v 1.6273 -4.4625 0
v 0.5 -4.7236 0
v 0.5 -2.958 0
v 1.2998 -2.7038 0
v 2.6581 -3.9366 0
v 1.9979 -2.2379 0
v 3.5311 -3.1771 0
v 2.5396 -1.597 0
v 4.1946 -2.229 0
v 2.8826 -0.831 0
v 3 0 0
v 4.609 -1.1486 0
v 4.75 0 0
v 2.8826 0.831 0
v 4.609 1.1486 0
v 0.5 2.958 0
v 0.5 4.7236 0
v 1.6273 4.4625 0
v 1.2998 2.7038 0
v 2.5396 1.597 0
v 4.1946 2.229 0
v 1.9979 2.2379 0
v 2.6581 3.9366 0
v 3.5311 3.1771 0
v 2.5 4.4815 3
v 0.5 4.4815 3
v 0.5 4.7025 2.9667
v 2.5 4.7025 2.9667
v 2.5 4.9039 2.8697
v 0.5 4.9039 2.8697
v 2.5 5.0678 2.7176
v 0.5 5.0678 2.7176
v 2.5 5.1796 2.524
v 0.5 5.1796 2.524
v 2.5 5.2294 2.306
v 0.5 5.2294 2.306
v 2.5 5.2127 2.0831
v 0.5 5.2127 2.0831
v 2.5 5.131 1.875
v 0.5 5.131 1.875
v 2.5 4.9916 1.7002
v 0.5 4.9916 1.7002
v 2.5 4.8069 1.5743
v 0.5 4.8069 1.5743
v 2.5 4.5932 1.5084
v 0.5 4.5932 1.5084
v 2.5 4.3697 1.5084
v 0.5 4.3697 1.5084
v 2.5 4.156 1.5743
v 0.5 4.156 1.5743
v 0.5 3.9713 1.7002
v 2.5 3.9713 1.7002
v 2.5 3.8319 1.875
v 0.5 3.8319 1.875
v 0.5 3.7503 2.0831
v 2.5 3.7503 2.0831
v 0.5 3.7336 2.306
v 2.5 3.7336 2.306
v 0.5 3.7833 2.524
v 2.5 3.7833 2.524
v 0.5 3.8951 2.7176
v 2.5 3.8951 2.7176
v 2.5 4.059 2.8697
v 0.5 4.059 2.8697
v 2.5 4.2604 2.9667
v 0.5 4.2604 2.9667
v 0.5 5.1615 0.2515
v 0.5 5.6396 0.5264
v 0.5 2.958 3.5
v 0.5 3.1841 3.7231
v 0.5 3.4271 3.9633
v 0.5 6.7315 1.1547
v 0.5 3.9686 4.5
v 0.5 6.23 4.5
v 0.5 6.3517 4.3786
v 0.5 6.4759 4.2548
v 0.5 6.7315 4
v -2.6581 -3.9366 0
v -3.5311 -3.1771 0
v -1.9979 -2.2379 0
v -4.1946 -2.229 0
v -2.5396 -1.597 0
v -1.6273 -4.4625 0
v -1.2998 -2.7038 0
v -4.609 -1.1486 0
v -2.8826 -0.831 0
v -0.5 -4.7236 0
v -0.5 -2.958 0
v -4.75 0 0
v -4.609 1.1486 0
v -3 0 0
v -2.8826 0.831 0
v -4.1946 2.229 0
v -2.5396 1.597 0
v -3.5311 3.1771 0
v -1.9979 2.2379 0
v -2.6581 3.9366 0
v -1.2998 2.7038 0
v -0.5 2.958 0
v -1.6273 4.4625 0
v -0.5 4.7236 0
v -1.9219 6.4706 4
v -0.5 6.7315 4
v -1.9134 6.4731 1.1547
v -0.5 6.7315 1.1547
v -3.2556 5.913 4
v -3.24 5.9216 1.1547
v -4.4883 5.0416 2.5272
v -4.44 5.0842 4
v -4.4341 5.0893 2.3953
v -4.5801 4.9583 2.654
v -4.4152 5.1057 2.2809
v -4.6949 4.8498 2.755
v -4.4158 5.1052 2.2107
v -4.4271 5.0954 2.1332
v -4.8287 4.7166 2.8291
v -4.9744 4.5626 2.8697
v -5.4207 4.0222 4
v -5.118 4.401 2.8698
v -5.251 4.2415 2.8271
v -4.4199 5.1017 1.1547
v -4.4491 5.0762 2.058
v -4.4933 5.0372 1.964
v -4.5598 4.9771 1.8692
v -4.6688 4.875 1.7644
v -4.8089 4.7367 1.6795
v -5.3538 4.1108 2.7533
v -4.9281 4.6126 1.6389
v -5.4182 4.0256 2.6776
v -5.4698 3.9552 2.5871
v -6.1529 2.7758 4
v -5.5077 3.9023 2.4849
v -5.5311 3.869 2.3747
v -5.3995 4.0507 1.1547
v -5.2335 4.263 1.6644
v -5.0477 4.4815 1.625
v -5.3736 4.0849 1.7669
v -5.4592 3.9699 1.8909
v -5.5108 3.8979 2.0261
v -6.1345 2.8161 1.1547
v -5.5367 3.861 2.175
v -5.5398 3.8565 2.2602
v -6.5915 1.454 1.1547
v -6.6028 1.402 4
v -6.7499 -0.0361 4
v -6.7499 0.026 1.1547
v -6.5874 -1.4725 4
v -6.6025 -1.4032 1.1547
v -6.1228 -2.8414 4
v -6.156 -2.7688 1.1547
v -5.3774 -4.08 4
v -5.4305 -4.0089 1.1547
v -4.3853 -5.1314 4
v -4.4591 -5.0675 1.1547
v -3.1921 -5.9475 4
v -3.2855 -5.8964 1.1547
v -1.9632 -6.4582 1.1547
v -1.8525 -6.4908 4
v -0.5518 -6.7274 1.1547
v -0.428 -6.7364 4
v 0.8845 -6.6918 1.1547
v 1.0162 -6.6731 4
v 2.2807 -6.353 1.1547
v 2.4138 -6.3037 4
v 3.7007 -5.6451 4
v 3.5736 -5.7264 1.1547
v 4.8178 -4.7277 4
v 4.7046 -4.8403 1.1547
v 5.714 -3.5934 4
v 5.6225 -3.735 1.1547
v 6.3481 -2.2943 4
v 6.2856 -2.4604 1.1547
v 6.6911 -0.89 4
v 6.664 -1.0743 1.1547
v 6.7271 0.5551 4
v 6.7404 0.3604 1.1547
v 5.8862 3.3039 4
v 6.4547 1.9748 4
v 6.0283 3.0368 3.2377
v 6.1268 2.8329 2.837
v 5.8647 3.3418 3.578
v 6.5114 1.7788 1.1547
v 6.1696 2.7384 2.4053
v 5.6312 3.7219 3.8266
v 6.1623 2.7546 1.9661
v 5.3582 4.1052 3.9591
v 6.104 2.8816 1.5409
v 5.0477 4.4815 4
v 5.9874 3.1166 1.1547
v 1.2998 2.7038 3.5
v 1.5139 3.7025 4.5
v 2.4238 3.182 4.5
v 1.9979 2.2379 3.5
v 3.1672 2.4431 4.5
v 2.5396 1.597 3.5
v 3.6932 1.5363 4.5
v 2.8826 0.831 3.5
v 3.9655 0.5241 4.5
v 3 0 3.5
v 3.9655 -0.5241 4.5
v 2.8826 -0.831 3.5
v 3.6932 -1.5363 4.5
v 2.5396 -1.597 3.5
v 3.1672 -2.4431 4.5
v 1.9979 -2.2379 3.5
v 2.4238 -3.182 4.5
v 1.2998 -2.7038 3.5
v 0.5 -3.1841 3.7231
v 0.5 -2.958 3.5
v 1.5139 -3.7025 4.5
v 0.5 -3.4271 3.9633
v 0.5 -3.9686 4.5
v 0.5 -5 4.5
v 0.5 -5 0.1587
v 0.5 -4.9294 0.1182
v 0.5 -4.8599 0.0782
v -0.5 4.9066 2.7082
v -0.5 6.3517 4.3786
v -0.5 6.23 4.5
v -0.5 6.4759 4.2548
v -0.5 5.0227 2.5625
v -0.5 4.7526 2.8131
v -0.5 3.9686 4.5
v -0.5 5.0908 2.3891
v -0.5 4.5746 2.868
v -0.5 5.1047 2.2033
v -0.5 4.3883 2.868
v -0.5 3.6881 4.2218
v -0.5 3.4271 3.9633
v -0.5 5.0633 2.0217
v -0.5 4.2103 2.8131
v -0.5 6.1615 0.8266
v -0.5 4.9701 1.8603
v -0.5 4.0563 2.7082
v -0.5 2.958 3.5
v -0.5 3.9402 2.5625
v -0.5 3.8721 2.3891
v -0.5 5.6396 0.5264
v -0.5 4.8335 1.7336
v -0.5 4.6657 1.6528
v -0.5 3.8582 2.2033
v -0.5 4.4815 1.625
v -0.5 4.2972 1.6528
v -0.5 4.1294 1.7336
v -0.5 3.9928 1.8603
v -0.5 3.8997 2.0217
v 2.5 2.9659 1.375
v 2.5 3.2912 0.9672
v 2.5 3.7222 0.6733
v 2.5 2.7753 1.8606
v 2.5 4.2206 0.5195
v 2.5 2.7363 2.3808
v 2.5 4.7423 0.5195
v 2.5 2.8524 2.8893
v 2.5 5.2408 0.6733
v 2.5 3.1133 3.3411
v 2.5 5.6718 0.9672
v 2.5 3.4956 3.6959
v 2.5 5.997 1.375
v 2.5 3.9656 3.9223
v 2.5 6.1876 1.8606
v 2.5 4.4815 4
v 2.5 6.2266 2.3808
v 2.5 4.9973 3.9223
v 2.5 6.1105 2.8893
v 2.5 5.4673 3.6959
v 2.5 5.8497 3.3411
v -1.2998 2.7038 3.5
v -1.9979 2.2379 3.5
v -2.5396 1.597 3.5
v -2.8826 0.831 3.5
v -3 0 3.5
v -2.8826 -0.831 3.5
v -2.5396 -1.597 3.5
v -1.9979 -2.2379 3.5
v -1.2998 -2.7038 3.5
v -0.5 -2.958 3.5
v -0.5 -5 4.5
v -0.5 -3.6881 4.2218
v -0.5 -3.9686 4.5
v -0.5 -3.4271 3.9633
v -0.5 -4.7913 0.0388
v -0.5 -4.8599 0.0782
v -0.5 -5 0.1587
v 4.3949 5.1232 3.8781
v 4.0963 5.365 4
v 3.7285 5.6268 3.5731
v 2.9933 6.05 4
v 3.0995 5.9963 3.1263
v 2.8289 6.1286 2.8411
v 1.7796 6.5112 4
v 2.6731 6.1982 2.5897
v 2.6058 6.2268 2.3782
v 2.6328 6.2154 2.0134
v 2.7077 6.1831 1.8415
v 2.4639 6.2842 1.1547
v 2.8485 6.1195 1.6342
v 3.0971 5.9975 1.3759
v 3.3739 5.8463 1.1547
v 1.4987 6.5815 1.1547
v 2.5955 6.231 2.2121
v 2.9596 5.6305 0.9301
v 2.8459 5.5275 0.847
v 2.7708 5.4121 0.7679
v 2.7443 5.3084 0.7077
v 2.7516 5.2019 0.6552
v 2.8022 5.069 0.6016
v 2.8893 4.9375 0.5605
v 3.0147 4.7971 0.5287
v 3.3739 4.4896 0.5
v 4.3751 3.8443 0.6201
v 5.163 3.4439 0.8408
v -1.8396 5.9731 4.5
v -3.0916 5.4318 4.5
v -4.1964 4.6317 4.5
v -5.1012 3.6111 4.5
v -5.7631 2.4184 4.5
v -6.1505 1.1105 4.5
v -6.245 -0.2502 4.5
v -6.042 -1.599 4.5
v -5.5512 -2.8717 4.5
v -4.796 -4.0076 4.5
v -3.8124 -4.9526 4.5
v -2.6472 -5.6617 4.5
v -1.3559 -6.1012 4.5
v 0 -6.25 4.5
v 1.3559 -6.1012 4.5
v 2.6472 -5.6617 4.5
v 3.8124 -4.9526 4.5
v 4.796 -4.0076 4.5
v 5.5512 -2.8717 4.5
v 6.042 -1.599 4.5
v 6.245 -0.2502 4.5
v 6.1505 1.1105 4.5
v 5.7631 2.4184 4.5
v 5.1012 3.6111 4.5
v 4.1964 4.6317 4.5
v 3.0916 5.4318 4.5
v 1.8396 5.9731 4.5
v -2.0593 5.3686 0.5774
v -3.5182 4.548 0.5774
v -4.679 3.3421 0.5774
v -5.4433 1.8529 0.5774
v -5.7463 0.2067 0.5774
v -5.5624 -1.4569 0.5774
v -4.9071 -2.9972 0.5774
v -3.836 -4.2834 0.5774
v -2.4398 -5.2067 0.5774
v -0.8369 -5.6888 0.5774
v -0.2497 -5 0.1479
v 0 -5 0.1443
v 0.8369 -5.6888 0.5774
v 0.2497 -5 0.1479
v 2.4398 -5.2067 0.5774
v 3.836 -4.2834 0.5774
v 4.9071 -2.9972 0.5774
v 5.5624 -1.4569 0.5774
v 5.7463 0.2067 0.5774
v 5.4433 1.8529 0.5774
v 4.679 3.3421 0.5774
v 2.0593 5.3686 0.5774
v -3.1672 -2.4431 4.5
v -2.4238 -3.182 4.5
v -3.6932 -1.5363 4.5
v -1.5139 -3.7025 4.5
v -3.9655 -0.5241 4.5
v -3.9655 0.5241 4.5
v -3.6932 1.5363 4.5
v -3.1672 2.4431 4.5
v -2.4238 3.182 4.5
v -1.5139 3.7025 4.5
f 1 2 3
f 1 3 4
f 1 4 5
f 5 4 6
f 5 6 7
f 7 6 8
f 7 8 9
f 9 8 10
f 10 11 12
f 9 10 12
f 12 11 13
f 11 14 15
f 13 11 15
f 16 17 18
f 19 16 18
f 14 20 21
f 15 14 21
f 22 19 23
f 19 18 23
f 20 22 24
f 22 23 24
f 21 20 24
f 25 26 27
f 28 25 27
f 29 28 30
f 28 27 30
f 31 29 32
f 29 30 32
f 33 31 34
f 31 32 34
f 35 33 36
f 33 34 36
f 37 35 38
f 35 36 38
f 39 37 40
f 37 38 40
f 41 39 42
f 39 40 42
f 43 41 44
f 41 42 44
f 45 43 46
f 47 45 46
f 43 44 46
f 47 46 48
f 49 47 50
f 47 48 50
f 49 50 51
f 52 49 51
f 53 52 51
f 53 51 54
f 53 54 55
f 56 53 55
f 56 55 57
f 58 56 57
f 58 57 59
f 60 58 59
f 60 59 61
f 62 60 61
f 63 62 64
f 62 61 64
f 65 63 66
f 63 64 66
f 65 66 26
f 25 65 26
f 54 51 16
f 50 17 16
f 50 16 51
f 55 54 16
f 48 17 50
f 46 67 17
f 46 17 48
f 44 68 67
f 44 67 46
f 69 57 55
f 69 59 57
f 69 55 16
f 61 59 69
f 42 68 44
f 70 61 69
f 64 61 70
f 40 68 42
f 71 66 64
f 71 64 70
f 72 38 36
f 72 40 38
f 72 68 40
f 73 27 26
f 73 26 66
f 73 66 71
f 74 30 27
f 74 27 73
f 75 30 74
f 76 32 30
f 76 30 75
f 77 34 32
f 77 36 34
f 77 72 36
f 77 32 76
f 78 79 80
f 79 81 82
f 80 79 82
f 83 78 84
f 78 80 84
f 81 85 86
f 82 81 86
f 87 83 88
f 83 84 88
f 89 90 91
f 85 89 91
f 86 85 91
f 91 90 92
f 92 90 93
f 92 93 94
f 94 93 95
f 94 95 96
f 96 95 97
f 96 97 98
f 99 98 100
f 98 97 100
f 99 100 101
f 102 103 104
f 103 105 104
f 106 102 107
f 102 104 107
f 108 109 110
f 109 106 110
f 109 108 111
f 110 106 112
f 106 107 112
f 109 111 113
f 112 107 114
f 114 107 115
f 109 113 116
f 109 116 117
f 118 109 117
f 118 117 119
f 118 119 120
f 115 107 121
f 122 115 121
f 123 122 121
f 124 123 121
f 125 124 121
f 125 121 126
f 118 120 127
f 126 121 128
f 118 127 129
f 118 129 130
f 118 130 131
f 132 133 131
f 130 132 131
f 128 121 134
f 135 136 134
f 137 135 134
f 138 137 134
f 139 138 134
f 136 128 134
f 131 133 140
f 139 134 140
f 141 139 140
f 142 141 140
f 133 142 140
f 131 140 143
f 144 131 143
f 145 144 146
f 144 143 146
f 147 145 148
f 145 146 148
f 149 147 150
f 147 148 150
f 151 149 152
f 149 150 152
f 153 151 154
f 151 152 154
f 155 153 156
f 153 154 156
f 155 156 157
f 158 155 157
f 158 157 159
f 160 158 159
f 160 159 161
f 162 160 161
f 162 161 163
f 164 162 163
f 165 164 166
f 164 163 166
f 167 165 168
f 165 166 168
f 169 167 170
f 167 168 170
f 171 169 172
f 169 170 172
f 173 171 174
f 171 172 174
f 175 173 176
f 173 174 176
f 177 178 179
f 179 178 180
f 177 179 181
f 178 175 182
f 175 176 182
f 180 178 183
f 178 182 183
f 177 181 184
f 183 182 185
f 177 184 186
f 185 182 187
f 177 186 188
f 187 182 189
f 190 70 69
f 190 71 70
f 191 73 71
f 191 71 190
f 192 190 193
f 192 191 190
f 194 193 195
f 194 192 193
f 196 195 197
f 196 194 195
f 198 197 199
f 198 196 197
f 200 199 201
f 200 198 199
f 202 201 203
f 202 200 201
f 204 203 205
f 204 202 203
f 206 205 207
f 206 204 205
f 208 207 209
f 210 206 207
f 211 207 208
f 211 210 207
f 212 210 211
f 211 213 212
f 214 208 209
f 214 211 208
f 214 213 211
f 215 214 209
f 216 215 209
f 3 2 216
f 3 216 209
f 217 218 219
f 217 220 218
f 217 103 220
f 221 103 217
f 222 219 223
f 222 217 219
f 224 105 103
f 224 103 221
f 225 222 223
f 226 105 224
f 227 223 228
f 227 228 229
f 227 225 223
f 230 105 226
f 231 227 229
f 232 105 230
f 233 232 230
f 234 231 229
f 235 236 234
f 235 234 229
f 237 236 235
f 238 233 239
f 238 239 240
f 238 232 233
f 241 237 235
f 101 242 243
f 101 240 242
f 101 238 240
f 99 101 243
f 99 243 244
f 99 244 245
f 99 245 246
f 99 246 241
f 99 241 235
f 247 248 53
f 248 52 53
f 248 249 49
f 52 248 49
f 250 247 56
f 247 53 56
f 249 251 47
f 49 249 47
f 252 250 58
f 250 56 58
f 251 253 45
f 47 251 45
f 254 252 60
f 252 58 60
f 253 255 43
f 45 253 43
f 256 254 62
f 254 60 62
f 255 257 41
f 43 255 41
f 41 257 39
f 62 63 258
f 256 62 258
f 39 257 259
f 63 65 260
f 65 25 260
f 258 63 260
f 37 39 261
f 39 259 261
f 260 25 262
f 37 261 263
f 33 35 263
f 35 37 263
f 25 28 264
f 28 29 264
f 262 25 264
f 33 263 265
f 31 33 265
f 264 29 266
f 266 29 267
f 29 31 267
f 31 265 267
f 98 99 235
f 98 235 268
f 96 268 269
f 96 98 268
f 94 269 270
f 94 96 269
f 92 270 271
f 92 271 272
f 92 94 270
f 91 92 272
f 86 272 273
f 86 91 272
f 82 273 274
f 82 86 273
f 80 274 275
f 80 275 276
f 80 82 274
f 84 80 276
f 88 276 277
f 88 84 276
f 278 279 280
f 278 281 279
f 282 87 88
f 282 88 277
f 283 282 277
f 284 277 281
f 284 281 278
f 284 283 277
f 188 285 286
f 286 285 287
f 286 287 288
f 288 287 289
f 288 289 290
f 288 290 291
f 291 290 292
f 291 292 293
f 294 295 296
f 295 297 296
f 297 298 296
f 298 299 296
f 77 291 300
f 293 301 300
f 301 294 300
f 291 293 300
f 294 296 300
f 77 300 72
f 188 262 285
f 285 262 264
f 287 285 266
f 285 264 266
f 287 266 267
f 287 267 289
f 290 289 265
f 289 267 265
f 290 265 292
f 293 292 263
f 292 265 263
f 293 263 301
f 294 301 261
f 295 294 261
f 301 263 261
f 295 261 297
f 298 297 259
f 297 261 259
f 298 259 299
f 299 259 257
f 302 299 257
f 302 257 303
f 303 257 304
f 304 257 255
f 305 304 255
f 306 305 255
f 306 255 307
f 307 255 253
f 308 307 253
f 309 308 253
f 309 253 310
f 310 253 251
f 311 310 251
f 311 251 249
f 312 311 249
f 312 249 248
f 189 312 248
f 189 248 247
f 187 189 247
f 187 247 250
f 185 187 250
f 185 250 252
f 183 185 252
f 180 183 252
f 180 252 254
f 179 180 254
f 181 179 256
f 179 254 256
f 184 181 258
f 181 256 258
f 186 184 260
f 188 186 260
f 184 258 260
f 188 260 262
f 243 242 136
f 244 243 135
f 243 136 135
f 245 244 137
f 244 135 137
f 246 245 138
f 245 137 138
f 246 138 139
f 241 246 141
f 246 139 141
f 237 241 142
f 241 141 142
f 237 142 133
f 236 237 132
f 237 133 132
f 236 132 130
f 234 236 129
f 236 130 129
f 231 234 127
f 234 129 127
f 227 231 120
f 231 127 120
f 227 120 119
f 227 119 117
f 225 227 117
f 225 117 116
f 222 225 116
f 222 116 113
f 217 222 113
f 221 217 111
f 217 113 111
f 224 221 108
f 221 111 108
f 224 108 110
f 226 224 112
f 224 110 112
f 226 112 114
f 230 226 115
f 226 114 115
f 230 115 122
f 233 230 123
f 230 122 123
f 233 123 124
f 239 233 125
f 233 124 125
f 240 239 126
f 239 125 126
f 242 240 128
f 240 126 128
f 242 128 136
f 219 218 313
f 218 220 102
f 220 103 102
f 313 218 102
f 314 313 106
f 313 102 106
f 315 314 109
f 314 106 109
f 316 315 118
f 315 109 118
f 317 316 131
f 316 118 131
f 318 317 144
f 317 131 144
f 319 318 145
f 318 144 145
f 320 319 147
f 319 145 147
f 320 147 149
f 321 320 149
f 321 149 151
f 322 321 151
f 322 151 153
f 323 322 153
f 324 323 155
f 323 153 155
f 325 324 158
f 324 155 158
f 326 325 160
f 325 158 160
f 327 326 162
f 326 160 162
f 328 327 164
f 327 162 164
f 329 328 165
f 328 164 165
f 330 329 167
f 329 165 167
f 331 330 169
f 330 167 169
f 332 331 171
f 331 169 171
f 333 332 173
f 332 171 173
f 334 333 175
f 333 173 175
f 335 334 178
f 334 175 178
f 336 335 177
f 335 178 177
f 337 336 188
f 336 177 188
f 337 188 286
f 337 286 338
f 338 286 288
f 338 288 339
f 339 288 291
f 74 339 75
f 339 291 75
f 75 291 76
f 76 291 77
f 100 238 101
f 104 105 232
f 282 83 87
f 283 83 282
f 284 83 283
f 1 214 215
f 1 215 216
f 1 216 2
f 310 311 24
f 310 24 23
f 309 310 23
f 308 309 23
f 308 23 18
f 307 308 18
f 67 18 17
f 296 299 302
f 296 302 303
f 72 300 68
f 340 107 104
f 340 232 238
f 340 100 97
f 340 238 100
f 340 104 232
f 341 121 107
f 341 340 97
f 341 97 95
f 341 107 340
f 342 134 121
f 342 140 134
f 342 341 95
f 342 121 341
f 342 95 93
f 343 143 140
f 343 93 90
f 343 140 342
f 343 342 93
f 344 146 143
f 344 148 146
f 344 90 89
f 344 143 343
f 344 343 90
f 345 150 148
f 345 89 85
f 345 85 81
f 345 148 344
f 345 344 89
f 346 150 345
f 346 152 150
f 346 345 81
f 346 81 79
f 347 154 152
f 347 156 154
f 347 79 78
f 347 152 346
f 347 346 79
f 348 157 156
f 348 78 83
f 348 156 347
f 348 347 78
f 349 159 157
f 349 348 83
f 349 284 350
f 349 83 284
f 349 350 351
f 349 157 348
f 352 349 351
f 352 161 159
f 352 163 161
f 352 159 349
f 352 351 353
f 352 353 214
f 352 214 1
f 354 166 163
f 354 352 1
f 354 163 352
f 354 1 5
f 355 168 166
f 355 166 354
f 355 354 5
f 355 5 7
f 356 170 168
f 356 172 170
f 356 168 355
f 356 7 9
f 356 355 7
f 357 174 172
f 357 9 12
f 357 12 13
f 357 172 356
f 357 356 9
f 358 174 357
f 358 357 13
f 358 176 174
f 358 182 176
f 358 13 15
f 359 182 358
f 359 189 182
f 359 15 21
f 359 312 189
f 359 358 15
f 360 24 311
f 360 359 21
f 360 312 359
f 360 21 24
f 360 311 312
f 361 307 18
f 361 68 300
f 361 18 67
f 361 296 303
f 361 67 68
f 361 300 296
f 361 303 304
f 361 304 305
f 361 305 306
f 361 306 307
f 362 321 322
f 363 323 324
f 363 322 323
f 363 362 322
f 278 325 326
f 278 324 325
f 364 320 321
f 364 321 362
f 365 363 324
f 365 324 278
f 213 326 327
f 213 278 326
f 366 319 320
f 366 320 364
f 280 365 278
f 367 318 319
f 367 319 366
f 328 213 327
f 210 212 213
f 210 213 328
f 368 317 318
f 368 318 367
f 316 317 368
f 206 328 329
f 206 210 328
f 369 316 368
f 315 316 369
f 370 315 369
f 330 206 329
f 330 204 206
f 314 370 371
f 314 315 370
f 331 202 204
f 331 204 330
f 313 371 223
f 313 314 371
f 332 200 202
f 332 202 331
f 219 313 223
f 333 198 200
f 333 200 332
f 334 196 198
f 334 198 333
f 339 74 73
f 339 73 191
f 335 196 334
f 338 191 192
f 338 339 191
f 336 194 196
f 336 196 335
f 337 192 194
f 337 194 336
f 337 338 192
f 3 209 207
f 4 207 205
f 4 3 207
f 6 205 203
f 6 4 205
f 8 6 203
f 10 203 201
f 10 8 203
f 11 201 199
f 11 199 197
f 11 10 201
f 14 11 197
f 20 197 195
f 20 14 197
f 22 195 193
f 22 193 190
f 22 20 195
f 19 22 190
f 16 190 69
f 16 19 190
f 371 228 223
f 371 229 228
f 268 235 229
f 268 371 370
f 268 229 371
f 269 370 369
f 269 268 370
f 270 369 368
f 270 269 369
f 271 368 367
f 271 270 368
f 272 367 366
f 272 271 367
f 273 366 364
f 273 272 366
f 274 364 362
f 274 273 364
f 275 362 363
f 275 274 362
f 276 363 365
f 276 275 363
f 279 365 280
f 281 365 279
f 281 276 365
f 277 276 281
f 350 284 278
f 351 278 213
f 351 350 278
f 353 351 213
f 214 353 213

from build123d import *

# Parameters (mm, degrees)
ESQUISSE1_R             = 6.75
ESQUISSE1_R_2           = 3
EXTRUSION1_DEPTH        = 4.5
CHANFREIN1_SIZE         = 2
CHANFREIN1_SIZE2        = 1.154700538
ENL_V_START             = -4.500004
ENL_V_MAT_EXTRU_1_DEPTH = 4.500004
CHANFREIN3_SIZE         = 0.5
ESQUISSE7_W             = 0.625
ESQUISSE7_H             = 6.25
ENL_V_MAT_EXTRU_3_REACH = 8.25
ESQUISSE8_R             = 1.75
ESQUISSE9_R             = 1.75
ESQUISSE9_R_2           = 0.75
EXTRUSION2_DEPTH        = 2
CHANFREIN4_SIZE         = 1
ESQUISSE10_R            = 3
ENL_V_MAT_EXTRU_4_DEPTH = 5.5000001


with BuildPart() as part:
    # Esquisse1 → Extrusion1 (new body)
    with BuildSketch(Plane.XY):
        Circle(ESQUISSE1_R)
        Circle(ESQUISSE1_R_2, mode=Mode.SUBTRACT)
    extrude(amount=EXTRUSION1_DEPTH)

    # Chanfrein1
    chanfrein1_edges = [part.edges().sort_by_distance(p)[0] for p in [
        (-6.75, 0, 0),
    ]]
    chanfrein1_side = [part.faces().sort_by_distance(p)[0] for p in [
        (-6.559081169, 0, 0),
    ]]
    chamfer(chanfrein1_edges, length=CHANFREIN1_SIZE, length2=CHANFREIN1_SIZE2, reference=chanfrein1_side[0])

    # Esquisse3 → Enlèv. mat.-Extru.1 (cut)
    with BuildSketch(Plane.XY.offset(4.5).offset(ENL_V_START)):
        with BuildLine():
            Line((-0.5, 6.731456009), (-0.5, -5))
            Line((-0.5, -5), (0.5, -5))
            Line((0.5, -5), (0.5, 6.731456009))
            ThreePointArc((0.5, 6.731456009), (0, 6.75), (-0.5, 6.731456009))
        make_face()
    extrude(amount=ENL_V_MAT_EXTRU_1_DEPTH, mode=Mode.SUBTRACT)

    # Chanfrein3
    chanfrein3_edges = [part.edges().sort_by_distance(p)[0] for p in [
        (-4.592793268, -4.946589734, 4.5),
    ]]
    chamfer(chanfrein3_edges, length=CHANFREIN3_SIZE)

    # Esquisse7 → Trou taraudé M1.61 (revolve, cut)
    with BuildSketch(Plane(origin=(-0.5, 4.481456009, 2.25), x_dir=(0, 0, -1), z_dir=(0, 1, 0))):
        with Locations((0.3125, 3.125)):
            Rectangle(ESQUISSE7_W, ESQUISSE7_H)
    revolve(axis=Axis((5.85, 4.481456009, 2.25), (-1, 0, 0)), mode=Mode.SUBTRACT)

    # Esquisse8 → Enlèv. mat.-Extru.3 (cut, up to next)
    with BuildSketch(Plane.ZY.offset(-0.5), mode=Mode.PRIVATE) as enl_v_mat_extru_3_sk1:
        with Locations((2.25, 4.481456009)):
            Circle(ESQUISSE8_R)
    enl_v_mat_extru_3_tool1 = extrude(enl_v_mat_extru_3_sk1.sketch, amount=-ENL_V_MAT_EXTRU_3_REACH, mode=Mode.PRIVATE) & part.part
    add(enl_v_mat_extru_3_tool1.solids().sort_by_distance((0.5, 4.481456, 2.25))[0], mode=Mode.SUBTRACT)

    # Esquisse9 → Extrusion2 (add)
    with BuildSketch(Plane.ZY.offset(-0.5)):
        with Locations((2.25, 4.481456009)):
            Circle(ESQUISSE9_R)
        with Locations((2.25, 4.481456009)):
            Circle(ESQUISSE9_R_2, mode=Mode.SUBTRACT)
    extrude(amount=-EXTRUSION2_DEPTH)

    # Chanfrein4
    chanfrein4_edges = [part.edges().sort_by_distance(p)[0] for p in [
        (-3, 0, 4.5),
        (3, 0, 4.5),
    ]]
    chamfer(chanfrein4_edges, length=CHANFREIN4_SIZE)

    # Esquisse10 → Enlèv. mat.-Extru.4 (cut, through all)
    with BuildSketch(Plane.XY.offset(4.5)):
        Circle(ESQUISSE10_R)
    extrude(amount=-ENL_V_MAT_EXTRU_4_DEPTH, mode=Mode.SUBTRACT)


solid = part.part
